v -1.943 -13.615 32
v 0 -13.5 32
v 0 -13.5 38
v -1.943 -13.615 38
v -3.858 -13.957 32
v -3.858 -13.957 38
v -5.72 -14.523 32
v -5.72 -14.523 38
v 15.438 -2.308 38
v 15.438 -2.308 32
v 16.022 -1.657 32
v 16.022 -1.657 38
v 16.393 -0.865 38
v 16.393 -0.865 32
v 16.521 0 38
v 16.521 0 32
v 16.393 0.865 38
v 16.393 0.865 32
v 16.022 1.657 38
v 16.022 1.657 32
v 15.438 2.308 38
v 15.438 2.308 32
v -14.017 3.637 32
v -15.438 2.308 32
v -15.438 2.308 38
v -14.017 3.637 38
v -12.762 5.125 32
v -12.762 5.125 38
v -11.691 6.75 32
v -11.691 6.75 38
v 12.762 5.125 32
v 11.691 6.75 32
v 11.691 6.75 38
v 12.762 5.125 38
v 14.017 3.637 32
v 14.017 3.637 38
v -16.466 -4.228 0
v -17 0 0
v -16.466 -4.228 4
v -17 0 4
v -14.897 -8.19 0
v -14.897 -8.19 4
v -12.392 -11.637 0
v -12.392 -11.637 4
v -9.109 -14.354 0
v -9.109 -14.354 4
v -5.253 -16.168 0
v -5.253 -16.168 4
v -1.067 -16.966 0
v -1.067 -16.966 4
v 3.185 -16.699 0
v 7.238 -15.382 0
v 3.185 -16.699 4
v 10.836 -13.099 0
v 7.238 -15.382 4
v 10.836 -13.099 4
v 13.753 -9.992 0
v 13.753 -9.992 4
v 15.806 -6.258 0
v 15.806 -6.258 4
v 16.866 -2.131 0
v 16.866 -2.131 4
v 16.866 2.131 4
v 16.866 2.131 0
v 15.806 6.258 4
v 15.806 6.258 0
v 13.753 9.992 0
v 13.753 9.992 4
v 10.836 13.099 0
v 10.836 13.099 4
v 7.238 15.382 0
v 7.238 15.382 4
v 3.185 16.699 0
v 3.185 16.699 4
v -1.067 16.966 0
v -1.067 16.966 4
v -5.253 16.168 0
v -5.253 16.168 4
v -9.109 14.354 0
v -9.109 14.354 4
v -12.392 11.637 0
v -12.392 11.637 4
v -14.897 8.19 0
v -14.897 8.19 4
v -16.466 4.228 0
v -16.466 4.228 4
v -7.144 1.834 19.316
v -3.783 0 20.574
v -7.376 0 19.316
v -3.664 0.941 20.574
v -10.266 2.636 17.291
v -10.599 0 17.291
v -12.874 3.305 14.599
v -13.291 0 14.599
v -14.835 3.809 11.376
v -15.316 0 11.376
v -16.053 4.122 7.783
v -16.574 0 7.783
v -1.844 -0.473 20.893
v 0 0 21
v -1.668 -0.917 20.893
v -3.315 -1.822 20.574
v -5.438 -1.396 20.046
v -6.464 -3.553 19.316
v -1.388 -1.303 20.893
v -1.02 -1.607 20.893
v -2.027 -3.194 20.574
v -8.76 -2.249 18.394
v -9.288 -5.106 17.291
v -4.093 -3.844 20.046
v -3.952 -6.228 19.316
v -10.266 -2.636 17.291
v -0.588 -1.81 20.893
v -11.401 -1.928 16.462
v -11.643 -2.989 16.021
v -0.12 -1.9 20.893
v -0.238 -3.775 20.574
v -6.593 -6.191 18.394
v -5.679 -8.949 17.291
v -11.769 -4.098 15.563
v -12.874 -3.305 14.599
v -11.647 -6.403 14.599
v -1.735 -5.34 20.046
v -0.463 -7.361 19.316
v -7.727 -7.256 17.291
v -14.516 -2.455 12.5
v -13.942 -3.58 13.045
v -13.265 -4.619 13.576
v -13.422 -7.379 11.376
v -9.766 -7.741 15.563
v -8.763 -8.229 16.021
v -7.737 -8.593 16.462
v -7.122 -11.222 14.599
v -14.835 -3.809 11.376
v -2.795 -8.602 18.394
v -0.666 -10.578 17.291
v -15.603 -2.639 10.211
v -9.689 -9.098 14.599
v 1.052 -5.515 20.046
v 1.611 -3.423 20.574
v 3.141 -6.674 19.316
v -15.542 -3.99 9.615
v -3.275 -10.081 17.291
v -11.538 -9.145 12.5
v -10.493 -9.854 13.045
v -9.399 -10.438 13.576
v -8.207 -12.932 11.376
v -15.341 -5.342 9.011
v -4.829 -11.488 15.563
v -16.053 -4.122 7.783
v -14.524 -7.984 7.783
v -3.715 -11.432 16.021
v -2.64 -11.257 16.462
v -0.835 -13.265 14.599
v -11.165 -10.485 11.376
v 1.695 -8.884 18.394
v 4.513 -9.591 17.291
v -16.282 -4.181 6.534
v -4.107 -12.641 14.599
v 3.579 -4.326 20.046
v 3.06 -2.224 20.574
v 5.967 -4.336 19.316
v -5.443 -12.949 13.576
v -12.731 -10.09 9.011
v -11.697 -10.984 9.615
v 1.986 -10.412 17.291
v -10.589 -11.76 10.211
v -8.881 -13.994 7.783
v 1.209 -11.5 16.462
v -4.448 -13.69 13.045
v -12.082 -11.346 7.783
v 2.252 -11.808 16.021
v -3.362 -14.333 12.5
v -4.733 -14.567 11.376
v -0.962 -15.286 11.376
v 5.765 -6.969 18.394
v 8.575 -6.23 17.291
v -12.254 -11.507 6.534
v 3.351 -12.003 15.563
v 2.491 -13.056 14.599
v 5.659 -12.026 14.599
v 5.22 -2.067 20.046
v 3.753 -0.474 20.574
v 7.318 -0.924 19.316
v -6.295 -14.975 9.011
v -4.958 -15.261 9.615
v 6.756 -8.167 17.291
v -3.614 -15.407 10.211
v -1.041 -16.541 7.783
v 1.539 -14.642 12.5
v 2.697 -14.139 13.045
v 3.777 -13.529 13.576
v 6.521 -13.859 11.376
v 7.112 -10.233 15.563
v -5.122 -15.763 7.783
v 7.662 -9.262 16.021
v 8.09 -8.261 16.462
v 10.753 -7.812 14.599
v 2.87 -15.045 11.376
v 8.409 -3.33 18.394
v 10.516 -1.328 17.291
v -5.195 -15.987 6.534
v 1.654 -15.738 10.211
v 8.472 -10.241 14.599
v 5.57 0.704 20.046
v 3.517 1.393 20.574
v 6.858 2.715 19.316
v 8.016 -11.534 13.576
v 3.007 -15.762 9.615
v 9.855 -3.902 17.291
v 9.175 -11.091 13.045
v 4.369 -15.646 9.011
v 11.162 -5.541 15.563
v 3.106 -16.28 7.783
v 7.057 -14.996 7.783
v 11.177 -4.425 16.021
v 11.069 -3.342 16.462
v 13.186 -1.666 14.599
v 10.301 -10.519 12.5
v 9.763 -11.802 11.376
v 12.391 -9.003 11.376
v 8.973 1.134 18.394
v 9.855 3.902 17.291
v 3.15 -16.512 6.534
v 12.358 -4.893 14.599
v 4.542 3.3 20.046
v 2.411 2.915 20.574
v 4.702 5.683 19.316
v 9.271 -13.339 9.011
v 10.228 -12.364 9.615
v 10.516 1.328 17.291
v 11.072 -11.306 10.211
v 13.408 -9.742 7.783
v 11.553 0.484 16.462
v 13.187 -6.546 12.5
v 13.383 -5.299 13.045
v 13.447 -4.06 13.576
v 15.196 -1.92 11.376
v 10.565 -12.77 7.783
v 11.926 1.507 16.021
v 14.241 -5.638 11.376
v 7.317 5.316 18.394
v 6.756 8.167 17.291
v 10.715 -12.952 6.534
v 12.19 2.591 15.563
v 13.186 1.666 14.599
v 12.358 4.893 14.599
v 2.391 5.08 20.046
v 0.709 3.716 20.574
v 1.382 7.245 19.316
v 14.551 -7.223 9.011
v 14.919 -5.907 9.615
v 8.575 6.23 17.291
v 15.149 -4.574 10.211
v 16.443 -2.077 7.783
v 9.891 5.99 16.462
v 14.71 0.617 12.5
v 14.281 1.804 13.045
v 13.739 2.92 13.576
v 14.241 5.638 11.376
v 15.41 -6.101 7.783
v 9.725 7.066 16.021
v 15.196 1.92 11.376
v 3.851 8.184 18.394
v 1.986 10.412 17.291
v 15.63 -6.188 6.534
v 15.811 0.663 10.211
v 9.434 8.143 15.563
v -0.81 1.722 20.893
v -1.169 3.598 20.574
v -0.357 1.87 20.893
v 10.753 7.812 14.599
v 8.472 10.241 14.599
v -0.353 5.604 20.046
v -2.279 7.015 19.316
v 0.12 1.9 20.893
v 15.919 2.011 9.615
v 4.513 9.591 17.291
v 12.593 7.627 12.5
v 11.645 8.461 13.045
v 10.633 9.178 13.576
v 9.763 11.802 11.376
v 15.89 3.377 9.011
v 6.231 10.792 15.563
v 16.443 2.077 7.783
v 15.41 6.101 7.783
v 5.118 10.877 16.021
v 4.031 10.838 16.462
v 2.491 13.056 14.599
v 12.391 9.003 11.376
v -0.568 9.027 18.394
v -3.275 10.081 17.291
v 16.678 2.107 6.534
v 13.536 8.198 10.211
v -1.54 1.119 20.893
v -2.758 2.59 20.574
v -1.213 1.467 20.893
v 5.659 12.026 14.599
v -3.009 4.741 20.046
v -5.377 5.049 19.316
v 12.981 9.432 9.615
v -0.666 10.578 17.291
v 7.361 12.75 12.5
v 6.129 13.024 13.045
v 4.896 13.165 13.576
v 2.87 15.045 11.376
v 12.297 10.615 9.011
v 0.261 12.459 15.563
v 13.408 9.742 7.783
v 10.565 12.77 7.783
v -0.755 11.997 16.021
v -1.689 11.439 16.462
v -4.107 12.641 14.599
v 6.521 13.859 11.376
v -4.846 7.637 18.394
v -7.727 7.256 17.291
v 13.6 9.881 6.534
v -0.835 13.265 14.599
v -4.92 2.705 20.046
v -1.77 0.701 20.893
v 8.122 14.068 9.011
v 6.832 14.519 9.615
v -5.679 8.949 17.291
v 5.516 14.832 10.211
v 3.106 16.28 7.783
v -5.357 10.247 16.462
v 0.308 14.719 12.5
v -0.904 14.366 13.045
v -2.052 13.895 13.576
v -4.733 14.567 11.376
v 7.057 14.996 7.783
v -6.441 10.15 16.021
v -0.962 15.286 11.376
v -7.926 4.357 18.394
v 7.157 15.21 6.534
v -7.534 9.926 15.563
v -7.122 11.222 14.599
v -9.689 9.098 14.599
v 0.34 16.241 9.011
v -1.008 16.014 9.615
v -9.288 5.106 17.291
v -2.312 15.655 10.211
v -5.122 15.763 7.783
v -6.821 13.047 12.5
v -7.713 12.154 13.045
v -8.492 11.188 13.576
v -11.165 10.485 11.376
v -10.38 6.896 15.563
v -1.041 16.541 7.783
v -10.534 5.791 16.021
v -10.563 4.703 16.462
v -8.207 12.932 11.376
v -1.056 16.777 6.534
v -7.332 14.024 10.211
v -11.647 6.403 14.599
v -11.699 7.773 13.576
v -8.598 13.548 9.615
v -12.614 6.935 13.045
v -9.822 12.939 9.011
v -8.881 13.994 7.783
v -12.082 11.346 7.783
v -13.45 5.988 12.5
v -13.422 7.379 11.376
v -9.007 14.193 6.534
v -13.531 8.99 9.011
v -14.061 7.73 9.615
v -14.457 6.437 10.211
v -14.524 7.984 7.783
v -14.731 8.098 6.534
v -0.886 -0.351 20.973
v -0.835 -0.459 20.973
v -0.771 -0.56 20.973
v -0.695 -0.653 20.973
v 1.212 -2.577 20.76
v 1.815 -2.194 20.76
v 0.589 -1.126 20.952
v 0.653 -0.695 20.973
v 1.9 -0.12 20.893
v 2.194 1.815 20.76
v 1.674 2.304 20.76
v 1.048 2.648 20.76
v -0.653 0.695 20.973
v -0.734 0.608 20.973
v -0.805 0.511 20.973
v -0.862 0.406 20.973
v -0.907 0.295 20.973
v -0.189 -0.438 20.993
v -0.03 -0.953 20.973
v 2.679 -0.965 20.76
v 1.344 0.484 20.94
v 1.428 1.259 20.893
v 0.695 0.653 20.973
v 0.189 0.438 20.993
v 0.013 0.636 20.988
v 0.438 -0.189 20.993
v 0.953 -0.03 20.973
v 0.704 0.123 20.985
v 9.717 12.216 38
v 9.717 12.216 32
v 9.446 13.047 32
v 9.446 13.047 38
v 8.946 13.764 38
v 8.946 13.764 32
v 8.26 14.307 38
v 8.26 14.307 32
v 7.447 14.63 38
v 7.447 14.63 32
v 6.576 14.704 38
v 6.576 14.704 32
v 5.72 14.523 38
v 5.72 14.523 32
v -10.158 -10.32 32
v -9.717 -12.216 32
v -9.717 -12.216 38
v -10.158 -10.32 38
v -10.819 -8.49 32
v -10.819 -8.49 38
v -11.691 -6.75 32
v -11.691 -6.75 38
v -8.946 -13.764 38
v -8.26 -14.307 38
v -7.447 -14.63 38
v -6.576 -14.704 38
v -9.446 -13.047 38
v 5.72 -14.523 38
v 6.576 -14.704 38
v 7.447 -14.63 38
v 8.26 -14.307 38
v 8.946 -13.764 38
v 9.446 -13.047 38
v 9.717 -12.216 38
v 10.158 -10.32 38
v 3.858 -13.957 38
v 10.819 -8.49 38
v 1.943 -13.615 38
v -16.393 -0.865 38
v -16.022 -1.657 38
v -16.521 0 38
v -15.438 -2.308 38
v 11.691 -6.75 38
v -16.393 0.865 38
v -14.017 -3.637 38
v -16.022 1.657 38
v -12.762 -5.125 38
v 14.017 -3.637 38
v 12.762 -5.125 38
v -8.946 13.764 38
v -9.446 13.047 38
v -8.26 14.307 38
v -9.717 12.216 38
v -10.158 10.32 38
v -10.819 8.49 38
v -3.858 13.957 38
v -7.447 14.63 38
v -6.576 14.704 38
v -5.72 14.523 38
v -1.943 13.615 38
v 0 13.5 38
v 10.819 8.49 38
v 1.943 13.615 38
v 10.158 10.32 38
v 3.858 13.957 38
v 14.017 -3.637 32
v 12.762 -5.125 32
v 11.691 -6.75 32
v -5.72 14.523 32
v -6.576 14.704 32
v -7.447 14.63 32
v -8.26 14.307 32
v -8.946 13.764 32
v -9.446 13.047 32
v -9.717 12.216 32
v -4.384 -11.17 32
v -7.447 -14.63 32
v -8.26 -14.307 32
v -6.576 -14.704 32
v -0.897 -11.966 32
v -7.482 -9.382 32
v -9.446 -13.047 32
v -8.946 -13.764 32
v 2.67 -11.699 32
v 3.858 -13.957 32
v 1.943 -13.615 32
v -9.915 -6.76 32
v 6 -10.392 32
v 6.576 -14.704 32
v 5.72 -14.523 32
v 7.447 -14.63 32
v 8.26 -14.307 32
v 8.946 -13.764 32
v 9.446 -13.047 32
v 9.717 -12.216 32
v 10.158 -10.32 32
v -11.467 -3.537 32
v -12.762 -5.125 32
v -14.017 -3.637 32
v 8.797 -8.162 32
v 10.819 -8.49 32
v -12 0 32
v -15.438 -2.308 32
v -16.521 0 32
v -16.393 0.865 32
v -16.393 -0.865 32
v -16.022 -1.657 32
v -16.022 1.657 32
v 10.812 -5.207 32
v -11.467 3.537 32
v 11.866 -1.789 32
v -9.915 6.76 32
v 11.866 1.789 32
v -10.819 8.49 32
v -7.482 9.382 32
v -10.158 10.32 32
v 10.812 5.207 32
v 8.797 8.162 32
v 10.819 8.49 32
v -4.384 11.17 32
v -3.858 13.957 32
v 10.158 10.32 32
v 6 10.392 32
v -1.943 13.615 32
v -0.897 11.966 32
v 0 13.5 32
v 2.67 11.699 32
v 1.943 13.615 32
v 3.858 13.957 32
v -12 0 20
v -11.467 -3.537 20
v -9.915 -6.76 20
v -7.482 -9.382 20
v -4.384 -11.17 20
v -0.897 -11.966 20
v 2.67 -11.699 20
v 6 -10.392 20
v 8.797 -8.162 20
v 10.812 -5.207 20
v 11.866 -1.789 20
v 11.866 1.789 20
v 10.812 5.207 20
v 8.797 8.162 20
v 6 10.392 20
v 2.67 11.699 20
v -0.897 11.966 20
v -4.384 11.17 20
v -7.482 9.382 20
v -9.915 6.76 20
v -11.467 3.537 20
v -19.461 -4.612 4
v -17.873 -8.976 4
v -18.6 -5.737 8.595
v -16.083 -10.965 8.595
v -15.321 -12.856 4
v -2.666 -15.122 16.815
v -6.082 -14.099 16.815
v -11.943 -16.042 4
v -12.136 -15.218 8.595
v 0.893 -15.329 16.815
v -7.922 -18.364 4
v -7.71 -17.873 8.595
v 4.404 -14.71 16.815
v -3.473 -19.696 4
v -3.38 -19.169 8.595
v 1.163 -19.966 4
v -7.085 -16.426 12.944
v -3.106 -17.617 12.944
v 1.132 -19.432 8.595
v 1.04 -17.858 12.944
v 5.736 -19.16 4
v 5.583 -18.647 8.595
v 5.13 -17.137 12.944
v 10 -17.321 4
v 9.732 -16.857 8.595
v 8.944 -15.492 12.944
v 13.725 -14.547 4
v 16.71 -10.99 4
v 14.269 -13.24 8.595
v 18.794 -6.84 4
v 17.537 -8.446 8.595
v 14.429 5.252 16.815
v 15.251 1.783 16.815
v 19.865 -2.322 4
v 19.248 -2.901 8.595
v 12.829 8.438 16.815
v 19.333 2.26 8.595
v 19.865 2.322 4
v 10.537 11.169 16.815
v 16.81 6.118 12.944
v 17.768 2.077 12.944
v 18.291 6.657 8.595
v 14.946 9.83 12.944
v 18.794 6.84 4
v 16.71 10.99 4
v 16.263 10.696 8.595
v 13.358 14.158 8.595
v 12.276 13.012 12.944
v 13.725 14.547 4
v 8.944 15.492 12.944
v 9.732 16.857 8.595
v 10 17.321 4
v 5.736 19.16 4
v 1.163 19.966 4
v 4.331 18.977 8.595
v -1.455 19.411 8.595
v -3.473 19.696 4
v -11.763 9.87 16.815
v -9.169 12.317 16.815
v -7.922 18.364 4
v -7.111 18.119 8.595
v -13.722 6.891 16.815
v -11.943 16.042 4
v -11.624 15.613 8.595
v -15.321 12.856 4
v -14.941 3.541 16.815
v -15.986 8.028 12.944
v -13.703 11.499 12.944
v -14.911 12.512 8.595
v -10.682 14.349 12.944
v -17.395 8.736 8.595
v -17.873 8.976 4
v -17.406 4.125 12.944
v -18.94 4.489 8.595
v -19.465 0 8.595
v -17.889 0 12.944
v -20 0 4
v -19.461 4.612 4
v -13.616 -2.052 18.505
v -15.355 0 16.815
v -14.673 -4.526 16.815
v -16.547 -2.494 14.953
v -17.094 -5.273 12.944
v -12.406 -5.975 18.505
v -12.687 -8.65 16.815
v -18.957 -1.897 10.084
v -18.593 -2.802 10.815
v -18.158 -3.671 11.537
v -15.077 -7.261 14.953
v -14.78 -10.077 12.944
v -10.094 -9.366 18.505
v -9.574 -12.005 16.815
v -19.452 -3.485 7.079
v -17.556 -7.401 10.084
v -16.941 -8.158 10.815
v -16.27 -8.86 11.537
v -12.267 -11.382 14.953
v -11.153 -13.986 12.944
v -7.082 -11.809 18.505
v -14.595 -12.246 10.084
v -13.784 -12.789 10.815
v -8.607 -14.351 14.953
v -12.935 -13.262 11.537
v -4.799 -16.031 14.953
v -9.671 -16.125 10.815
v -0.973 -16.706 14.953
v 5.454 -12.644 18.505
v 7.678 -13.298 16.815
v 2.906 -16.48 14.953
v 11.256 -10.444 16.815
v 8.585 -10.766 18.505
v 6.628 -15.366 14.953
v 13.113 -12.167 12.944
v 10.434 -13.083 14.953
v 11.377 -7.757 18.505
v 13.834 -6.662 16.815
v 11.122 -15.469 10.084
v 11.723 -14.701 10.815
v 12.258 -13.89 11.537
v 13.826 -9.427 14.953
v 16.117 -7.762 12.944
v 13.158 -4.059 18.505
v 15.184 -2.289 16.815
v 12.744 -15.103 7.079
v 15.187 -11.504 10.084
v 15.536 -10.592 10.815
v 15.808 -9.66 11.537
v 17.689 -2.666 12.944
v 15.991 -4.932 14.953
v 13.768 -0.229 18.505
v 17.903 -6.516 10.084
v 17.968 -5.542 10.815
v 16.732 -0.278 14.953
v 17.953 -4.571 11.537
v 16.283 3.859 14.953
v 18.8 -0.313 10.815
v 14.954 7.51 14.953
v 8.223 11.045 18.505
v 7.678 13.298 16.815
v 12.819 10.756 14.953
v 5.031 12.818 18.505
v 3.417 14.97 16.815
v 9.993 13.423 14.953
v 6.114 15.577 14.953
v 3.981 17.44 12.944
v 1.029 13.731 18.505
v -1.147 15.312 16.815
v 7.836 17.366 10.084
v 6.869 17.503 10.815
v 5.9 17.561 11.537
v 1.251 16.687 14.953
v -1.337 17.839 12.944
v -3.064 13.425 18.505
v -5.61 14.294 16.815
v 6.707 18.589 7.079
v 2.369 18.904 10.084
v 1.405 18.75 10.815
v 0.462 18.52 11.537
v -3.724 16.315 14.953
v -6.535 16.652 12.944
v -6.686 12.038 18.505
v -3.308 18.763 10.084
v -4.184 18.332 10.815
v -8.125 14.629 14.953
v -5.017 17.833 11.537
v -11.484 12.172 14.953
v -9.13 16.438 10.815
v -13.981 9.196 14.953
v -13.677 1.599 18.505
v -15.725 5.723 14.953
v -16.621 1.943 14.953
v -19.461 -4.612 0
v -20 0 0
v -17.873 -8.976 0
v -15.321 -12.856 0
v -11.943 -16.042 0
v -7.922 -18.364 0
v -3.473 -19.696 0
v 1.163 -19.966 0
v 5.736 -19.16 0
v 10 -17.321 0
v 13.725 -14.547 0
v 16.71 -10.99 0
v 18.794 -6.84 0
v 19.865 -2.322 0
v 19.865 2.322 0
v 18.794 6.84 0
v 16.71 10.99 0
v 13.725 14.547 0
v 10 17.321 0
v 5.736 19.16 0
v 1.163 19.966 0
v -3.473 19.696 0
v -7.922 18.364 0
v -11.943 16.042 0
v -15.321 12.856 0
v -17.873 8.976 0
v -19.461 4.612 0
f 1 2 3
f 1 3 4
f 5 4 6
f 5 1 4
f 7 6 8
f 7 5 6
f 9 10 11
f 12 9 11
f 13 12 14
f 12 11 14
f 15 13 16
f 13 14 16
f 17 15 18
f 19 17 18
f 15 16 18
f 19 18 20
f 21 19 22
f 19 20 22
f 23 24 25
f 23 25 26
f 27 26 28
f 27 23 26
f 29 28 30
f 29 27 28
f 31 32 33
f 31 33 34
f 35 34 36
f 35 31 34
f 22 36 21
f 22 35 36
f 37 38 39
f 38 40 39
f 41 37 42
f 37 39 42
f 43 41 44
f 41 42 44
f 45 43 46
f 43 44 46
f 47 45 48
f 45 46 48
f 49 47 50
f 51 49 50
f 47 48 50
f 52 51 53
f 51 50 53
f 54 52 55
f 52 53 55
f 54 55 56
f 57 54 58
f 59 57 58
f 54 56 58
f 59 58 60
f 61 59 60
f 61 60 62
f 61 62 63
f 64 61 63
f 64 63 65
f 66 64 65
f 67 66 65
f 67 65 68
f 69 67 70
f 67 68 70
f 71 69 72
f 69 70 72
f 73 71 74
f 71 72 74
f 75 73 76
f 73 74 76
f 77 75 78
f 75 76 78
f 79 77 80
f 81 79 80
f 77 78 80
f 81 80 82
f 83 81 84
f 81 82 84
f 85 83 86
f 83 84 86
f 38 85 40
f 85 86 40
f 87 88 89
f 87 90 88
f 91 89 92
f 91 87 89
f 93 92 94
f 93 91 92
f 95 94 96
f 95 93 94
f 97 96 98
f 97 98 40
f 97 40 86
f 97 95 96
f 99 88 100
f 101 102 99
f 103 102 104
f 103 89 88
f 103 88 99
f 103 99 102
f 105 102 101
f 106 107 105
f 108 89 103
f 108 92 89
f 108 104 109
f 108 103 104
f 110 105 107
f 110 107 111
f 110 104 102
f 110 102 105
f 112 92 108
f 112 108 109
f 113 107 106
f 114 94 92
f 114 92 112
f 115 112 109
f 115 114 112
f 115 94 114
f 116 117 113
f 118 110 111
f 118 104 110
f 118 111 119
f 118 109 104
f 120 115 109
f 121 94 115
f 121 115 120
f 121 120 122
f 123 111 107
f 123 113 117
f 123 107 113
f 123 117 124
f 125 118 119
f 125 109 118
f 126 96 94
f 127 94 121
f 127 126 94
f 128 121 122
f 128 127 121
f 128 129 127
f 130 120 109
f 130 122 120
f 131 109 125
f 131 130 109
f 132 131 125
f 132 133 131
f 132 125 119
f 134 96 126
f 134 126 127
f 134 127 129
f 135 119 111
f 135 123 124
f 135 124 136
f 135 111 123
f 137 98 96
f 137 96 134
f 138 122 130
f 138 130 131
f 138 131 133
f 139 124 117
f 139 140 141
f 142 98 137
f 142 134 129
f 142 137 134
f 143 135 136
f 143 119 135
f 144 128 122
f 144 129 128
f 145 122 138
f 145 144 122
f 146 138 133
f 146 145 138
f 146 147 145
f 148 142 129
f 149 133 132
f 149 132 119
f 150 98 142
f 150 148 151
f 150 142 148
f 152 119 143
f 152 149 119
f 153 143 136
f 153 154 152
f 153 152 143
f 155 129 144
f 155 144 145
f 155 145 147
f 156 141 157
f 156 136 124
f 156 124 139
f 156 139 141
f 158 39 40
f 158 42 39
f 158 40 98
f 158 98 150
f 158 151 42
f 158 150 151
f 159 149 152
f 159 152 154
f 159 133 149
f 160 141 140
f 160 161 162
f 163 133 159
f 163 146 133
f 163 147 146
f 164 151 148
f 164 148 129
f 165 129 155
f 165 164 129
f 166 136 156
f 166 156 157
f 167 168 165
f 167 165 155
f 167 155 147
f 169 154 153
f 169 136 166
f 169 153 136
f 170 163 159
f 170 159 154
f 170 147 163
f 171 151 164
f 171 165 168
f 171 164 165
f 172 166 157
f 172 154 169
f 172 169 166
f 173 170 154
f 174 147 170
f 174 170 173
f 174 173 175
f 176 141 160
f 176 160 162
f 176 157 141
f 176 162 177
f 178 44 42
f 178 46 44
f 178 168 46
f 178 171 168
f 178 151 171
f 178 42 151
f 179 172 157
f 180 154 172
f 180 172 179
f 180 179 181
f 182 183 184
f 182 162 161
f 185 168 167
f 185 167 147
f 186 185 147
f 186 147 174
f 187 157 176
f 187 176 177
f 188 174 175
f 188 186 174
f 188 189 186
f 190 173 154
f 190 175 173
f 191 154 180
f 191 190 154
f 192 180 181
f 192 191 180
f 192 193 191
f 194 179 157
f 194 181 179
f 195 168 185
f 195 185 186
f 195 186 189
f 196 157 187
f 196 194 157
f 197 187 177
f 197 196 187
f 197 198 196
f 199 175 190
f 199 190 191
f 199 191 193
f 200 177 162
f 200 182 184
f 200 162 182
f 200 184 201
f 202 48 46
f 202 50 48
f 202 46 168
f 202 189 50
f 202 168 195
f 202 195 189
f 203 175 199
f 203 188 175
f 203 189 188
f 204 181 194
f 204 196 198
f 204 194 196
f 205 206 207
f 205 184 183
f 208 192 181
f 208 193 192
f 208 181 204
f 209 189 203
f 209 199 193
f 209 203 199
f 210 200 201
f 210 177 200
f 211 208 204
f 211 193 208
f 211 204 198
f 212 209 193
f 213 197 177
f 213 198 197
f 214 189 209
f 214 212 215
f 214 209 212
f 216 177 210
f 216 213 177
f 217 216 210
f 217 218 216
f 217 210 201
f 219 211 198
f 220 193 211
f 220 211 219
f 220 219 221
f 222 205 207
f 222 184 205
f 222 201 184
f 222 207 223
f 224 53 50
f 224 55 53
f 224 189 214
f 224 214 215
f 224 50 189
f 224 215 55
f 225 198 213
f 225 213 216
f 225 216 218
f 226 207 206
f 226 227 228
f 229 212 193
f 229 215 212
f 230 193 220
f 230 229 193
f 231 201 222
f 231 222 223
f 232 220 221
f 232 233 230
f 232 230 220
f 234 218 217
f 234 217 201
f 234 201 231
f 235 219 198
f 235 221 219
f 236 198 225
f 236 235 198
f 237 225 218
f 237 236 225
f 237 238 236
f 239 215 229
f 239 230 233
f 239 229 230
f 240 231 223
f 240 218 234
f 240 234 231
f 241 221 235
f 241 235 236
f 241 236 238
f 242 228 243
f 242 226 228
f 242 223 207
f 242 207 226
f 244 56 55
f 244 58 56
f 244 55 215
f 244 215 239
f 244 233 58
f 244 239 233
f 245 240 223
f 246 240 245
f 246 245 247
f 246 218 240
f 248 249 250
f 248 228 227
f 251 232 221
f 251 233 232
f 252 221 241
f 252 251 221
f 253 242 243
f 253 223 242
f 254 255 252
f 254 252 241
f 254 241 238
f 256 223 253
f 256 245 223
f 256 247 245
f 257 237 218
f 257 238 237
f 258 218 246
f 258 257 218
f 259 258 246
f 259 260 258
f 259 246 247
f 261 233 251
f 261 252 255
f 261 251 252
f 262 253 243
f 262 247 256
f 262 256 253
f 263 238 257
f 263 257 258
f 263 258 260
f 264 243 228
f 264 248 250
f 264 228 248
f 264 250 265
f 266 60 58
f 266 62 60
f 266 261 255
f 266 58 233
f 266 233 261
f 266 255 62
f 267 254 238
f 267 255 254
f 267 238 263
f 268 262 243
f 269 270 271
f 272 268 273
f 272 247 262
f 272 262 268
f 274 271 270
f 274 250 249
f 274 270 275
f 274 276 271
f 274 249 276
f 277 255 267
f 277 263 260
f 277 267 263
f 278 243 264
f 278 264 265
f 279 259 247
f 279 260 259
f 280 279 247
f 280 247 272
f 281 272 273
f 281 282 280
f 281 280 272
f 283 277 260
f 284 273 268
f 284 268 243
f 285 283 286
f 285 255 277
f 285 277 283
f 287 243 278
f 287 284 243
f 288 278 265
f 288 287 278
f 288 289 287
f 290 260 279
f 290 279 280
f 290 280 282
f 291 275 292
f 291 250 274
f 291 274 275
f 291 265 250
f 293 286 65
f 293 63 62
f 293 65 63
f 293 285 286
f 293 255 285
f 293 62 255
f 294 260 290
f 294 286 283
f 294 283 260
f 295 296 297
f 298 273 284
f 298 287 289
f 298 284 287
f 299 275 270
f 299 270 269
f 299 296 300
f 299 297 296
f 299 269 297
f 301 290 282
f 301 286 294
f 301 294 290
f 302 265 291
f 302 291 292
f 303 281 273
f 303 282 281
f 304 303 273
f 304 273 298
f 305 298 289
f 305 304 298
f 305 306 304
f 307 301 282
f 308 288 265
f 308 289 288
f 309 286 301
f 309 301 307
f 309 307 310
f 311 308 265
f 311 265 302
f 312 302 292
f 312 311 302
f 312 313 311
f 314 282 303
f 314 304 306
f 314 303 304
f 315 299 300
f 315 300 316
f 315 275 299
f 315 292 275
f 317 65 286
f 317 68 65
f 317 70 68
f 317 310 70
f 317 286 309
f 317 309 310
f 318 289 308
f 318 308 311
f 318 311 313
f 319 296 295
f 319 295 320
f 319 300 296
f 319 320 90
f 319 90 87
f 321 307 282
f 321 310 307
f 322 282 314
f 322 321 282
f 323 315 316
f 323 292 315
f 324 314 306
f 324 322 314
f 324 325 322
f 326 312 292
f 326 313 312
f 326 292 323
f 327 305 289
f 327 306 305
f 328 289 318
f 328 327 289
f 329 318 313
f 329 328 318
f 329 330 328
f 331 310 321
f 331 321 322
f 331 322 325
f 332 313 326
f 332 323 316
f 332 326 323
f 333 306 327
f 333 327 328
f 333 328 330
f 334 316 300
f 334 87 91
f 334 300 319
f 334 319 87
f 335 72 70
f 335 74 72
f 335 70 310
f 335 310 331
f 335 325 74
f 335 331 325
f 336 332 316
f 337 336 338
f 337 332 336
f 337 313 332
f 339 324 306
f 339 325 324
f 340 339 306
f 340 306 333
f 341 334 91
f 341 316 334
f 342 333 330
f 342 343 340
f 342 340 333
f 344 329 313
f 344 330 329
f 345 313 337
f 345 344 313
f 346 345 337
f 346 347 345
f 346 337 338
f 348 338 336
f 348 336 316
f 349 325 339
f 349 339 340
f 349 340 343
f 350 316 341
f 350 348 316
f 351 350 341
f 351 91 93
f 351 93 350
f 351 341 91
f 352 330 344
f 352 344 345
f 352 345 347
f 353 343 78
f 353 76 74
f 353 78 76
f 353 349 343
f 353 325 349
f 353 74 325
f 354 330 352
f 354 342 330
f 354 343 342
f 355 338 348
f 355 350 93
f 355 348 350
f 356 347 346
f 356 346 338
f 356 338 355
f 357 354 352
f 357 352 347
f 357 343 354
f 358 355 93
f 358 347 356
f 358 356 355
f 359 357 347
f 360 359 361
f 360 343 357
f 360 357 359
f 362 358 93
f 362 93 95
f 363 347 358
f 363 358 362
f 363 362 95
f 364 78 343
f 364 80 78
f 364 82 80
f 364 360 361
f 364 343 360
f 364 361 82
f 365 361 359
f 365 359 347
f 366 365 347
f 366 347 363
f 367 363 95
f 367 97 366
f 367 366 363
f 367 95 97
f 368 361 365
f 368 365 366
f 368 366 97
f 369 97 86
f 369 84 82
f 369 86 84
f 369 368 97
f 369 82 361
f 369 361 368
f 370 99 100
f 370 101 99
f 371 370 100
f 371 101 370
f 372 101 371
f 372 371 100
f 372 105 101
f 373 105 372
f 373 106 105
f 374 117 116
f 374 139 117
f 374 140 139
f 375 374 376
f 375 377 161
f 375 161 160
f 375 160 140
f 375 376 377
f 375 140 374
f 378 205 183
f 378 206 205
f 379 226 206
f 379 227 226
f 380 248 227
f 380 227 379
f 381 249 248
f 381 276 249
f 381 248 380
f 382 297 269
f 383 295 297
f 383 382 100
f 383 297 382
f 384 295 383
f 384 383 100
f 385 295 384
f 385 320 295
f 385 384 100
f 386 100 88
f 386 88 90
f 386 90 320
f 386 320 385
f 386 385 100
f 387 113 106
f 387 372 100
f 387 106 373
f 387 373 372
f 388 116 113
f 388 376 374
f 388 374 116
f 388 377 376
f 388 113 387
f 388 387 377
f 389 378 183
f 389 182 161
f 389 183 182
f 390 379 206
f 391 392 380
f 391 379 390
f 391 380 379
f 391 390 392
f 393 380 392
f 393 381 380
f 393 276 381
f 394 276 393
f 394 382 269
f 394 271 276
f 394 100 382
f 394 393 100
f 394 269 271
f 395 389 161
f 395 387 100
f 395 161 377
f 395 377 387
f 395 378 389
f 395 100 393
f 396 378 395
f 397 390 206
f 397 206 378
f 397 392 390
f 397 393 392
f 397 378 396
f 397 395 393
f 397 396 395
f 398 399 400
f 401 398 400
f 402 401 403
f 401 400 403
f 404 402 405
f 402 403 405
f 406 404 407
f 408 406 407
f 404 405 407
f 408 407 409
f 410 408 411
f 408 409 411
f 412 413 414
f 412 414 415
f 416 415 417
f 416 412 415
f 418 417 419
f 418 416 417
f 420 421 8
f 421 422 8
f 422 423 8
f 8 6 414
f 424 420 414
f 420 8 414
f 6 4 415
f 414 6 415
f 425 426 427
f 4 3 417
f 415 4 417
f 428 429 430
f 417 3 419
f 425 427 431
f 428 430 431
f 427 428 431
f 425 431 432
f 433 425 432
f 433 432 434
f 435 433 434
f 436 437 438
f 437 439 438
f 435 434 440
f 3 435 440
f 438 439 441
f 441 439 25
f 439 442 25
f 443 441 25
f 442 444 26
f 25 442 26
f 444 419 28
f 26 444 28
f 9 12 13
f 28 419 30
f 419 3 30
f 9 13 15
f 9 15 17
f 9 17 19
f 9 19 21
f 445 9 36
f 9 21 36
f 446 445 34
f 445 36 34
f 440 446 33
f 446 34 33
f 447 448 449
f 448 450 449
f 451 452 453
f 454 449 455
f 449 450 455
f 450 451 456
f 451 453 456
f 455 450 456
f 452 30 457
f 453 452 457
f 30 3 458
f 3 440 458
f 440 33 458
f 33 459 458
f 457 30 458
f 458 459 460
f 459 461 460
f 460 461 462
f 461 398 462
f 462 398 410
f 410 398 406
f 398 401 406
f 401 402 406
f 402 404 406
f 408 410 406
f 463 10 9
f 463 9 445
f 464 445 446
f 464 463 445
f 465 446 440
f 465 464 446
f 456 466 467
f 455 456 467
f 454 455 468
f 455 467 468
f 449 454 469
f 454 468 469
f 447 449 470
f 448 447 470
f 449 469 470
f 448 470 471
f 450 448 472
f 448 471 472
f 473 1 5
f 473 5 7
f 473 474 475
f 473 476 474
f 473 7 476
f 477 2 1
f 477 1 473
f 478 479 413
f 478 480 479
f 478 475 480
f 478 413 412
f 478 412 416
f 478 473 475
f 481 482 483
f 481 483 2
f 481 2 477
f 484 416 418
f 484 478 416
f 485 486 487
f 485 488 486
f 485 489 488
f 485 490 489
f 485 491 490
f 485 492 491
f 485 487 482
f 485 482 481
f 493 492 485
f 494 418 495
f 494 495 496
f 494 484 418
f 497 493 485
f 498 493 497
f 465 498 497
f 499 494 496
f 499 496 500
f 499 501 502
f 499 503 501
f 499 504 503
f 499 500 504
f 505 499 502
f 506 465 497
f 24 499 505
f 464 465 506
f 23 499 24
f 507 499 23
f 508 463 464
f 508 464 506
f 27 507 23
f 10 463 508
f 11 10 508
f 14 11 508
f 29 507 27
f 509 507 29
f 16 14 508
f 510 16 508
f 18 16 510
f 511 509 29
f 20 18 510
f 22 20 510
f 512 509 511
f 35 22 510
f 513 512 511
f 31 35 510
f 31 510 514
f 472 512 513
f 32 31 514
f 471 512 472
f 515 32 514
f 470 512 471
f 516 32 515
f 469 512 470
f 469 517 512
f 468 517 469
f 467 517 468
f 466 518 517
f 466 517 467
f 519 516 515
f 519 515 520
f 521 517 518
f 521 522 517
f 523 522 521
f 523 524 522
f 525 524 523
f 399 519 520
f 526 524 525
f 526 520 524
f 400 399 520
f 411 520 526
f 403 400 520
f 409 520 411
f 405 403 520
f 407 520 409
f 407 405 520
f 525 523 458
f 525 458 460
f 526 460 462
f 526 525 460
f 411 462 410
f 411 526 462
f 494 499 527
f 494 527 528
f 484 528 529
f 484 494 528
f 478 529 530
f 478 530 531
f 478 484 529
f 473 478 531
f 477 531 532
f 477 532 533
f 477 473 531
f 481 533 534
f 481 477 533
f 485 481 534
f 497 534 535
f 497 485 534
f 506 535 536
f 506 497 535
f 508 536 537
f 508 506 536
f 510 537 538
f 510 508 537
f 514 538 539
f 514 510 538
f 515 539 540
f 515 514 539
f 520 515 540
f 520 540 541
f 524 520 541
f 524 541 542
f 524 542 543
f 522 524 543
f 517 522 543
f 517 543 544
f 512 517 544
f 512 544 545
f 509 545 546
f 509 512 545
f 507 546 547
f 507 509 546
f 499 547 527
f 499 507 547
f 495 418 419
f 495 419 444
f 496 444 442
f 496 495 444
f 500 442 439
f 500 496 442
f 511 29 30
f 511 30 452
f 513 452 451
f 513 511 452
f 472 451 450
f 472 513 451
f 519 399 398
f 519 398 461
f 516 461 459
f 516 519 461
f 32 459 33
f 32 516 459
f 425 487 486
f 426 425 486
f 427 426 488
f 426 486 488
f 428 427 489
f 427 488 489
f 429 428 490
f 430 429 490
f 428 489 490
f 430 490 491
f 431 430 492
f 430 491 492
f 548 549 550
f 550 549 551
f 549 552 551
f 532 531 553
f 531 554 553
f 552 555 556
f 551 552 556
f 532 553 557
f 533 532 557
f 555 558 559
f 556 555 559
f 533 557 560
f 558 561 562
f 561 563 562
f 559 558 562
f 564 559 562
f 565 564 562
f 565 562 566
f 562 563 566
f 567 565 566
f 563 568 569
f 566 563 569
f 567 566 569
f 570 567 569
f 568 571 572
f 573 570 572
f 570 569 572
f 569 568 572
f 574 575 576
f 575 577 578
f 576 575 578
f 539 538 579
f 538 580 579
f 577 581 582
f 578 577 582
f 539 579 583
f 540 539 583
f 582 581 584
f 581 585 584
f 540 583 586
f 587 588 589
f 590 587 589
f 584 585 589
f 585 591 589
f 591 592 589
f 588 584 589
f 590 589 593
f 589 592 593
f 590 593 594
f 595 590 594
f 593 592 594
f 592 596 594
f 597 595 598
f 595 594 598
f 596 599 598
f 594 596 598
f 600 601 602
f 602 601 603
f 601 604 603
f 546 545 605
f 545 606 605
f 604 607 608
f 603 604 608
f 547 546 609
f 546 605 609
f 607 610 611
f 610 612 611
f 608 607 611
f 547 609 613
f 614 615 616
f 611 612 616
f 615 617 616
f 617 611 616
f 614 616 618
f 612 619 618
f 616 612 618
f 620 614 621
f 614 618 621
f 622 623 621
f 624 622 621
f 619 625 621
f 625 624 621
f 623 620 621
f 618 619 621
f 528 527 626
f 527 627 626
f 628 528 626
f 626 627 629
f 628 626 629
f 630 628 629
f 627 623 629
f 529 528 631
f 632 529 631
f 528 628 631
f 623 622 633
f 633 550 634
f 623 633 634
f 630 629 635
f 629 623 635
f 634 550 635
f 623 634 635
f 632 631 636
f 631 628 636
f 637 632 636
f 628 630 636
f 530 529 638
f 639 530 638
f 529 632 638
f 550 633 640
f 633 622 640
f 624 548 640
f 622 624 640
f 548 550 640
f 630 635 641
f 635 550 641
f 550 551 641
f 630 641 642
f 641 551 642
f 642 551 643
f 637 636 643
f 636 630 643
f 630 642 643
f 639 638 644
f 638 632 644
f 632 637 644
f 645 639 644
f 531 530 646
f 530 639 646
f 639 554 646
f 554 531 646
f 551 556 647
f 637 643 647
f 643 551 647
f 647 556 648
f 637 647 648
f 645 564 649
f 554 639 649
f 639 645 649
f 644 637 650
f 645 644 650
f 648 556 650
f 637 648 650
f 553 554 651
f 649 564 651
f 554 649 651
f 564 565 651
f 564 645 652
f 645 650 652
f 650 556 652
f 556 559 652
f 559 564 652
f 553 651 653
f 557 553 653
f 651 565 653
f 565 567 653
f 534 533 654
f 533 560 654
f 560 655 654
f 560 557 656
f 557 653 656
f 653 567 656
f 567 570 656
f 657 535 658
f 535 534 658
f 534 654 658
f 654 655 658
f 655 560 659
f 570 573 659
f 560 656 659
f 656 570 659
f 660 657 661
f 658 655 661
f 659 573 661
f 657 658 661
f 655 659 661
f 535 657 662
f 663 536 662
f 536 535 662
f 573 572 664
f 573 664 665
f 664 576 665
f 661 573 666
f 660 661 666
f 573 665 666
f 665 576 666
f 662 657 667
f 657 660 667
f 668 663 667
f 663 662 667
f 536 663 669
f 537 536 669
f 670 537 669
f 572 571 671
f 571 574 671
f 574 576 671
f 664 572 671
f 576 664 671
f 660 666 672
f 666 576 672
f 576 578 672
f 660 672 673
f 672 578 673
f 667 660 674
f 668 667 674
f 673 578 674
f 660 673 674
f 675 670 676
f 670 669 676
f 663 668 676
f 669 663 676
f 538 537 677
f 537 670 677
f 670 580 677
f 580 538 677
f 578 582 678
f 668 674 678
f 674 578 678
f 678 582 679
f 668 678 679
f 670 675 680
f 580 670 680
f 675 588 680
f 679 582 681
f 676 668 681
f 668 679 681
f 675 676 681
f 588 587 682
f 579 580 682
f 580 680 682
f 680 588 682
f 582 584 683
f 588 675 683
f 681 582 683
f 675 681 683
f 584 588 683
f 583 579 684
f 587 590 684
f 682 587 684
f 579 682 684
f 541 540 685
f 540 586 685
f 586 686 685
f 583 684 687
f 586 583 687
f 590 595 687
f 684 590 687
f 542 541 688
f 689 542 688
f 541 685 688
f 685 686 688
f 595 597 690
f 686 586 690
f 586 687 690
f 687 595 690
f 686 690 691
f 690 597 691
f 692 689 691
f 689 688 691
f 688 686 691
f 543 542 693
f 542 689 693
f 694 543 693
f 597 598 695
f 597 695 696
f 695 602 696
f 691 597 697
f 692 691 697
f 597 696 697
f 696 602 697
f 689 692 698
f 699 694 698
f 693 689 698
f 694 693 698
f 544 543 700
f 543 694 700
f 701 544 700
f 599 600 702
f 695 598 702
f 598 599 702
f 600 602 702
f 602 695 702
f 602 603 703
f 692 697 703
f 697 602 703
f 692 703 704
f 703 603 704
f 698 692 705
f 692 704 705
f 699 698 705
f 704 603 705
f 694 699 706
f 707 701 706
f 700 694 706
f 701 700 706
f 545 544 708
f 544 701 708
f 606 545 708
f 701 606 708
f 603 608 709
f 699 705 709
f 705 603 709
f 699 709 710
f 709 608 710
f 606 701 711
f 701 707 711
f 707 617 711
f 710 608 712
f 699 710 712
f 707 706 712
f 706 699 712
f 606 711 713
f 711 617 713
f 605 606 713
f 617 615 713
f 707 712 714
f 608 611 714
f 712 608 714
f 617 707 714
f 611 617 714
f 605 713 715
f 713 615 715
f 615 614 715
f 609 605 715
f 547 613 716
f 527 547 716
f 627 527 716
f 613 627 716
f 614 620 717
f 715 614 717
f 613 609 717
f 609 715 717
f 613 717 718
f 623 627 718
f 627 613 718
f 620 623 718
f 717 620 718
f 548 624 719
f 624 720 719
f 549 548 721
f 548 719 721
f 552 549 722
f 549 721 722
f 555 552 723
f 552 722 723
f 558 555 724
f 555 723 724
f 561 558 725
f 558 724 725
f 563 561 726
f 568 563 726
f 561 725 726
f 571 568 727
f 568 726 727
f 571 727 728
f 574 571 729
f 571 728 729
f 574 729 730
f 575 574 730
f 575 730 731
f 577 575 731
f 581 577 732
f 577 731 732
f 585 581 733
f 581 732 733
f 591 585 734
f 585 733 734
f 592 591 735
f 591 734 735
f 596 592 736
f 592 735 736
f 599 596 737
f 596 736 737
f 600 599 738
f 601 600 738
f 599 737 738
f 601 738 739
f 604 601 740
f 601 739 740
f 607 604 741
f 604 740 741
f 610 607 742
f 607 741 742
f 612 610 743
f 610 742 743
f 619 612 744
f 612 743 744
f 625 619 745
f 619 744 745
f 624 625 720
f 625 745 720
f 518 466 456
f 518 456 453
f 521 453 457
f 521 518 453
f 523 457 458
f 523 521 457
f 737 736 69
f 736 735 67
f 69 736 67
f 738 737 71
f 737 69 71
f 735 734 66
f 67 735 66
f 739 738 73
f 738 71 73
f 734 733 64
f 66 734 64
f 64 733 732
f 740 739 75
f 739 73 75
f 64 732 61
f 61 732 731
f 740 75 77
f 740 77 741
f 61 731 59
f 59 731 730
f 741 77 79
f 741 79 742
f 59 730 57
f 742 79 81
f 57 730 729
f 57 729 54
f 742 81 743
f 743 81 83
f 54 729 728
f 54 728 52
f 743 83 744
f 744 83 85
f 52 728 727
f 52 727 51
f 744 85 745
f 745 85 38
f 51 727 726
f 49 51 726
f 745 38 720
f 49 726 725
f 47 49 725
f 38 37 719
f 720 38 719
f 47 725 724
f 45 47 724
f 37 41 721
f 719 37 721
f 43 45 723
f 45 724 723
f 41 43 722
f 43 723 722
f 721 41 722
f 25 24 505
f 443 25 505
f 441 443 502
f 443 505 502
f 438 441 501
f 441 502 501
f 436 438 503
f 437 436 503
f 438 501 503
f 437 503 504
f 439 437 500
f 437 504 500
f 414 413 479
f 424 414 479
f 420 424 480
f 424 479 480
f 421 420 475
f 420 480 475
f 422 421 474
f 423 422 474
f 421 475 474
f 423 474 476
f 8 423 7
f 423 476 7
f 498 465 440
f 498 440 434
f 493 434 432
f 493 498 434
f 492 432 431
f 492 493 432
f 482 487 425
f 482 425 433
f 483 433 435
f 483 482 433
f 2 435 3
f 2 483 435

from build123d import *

# Parameters (mm, degrees)
PAD001_DEPTH       = 6
POLARPATTERN_COUNT = 6


with BuildPart() as part:
    # Sketch (on XZ_Plane of Origin) → Revolution (revolve)
    with BuildSketch(Plane.XZ):
        with BuildLine():
            Line((0, 32), (0, 21))
            ThreePointArc((0, 21), (-12.020815, 16.020815), (-17, 4))
            Line((-17, 0), (-17, 4))
            Line((-20, 0), (-17, 0))
            Line((-20, 4), (-20, 0))
            ThreePointArc((-12, 20), (-17.888544, 12.944272), (-20, 4))
            Line((-12, 20), (-12, 32))
            Line((-12, 32), (0, 32))
        make_face()
    revolve(axis=Axis((0, 0, 0), (0, 0, 1)))

    # Sketch001 (on Face2 of Revolution) → Pad001 (new body)
    with BuildSketch(Plane.XY.offset(32)):
        with BuildLine():
            ThreePointArc((0, 13.5), (2.90558, 13.757845), (5.72035, 14.523321))
            ThreePointArc((9.71739, 12.215628), (8.260413, 14.307455), (5.72035, 14.523321))
            ThreePointArc((9.71739, 12.215628), (10.461853, 9.395229), (11.691343, 6.75))
            Line((0, 0), (11.691343, 6.75))
            Line((0, 13.5), (0, 0))
        make_face()
    pad001 = extrude(amount=PAD001_DEPTH)

    # PolarPattern: Pad001 ×6 about axis
    polarpattern_axis = Axis((0, 0, 32), (0, 0, 1))
    for i in range(1, POLARPATTERN_COUNT):
        add(pad001.rotate(polarpattern_axis, i * 360 / POLARPATTERN_COUNT))


solid = part.part
